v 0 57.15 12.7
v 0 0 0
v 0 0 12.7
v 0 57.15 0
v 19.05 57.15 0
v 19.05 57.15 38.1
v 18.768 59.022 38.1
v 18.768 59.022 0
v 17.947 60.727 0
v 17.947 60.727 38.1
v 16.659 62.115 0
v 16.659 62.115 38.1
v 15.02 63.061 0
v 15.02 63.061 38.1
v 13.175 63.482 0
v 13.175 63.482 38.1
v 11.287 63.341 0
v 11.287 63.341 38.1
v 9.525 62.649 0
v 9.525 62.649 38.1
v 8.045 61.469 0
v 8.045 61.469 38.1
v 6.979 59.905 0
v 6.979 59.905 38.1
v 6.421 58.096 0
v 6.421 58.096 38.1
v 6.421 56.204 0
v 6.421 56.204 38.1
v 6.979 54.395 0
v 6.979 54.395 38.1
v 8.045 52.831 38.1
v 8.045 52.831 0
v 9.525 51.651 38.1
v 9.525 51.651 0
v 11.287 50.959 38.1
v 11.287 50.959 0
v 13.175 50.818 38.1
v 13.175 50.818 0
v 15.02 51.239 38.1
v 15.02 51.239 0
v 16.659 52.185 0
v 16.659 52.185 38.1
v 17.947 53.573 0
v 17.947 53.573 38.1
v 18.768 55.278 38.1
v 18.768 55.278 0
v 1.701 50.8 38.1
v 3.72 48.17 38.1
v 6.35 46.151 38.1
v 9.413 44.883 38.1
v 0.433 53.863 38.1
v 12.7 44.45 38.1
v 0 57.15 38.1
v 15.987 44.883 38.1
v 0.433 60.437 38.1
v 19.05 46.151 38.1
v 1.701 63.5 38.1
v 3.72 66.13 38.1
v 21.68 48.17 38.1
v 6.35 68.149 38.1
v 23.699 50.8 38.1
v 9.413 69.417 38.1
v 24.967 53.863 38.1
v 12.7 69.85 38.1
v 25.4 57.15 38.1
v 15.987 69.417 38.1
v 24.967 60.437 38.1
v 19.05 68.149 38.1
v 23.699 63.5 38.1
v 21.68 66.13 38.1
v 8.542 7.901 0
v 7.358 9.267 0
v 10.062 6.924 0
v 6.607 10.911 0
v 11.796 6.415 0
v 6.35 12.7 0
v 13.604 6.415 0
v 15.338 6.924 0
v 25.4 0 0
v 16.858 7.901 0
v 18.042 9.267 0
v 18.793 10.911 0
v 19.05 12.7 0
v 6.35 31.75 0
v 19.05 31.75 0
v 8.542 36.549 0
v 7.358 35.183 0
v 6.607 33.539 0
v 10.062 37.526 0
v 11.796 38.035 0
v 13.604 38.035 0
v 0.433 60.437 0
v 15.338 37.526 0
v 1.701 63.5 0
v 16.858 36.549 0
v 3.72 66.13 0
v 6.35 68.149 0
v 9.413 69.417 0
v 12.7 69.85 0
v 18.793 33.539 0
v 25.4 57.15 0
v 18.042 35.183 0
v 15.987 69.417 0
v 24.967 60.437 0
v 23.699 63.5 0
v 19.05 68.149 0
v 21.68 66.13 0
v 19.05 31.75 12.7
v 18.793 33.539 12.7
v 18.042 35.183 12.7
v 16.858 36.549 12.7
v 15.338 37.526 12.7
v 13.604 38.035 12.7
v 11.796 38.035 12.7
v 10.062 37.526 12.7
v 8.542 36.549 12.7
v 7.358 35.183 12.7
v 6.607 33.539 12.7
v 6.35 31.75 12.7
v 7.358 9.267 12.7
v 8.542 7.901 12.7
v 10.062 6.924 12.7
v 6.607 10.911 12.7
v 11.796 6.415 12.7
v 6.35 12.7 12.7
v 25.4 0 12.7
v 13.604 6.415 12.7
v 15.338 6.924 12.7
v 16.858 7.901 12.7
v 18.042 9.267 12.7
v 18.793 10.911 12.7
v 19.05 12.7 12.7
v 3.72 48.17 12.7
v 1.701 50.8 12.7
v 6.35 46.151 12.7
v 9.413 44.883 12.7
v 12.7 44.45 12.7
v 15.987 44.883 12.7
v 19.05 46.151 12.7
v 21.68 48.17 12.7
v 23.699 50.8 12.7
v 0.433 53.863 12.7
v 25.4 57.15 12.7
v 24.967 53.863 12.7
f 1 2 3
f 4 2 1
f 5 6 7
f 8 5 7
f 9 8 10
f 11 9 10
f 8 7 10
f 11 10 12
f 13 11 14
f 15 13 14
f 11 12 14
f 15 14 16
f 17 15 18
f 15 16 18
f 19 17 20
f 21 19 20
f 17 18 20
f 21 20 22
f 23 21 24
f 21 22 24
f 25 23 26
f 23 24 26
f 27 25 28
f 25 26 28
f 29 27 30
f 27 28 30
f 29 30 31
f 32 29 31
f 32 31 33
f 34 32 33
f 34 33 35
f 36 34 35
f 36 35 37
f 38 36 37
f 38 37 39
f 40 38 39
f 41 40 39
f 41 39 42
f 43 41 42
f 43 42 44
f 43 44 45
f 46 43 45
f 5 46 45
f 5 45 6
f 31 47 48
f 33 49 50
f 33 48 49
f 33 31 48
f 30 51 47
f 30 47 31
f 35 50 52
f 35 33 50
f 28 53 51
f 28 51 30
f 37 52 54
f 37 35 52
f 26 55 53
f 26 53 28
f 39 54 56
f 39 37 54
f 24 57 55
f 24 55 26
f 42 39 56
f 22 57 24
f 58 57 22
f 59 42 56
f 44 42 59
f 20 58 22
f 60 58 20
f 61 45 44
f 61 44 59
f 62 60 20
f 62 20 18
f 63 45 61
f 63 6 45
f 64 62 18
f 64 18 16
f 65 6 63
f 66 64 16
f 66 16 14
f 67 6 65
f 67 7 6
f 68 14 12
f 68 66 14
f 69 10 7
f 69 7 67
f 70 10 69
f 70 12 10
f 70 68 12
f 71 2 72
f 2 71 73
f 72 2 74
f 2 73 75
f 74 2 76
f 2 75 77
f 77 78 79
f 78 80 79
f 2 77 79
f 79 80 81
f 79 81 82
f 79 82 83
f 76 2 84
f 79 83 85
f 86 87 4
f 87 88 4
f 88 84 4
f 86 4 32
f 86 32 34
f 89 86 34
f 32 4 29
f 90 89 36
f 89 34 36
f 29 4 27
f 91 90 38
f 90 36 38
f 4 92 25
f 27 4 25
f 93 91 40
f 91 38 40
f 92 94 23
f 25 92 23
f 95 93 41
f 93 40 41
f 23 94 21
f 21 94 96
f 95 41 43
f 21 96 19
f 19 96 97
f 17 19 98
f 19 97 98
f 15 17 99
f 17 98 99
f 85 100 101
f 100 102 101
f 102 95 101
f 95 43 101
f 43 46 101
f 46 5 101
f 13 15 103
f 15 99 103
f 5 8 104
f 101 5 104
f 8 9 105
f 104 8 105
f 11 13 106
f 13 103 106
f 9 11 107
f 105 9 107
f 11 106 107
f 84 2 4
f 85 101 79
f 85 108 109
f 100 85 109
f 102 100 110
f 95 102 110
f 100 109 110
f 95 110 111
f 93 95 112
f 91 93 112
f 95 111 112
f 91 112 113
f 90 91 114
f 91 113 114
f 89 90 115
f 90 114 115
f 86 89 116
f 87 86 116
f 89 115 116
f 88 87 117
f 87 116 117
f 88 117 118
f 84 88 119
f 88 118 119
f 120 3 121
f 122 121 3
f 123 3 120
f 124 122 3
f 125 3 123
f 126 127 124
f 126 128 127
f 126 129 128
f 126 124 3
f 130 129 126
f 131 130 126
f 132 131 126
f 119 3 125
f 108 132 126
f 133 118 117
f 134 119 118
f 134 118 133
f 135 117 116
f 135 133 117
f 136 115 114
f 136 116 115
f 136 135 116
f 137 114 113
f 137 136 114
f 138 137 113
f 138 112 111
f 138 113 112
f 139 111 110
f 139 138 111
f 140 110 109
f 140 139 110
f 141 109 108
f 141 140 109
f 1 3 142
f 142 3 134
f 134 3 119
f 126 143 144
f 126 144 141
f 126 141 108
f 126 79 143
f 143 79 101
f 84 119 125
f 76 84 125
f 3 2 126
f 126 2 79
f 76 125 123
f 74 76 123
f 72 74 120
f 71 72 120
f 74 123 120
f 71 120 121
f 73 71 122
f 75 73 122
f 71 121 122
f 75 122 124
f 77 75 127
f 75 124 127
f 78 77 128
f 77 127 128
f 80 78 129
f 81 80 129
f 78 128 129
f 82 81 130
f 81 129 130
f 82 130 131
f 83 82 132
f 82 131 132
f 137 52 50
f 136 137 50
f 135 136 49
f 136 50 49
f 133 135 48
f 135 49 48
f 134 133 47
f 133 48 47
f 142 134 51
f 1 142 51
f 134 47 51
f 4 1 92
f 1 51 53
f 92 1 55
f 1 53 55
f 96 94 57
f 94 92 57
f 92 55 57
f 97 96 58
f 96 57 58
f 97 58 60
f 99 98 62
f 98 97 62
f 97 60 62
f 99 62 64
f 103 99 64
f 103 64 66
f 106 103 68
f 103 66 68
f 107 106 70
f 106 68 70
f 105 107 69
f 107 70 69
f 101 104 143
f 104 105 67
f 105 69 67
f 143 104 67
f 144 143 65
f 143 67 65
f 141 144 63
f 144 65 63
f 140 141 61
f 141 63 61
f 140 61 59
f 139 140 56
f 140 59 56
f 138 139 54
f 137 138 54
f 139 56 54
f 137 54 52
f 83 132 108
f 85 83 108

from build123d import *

# Parameters (mm, degrees)
F0_W      = 25.4
F0_H      = 69.85
F1_DEPTH  = 38.1
F2_W      = 44.45
F2_H      = 25.4
F3_DEPTH  = 25.4
F5_DEPTH  = 25.4
F7_DEPTH  = 25.4
F4_W      = 25.4
F4_H      = 25.4
F8_DEPTH  = 25.4
F9_R      = 6.35
F10_DEPTH = 76.2
F11_DEPTH = 25.4
F13_DEPTH = 25.4


with BuildPart() as f1:
    # F0 (on Top) → F1 (new body)
    with BuildSketch(Plane.XY):
        with Locations((12.7, 34.925)):
            Rectangle(F0_W, F0_H)
    extrude(amount=F1_DEPTH)

    # F2 (on face) → F3 (cut)
    with BuildSketch(Plane(origin=(0, 0, 0), x_dir=(0, -1, 0), z_dir=(-1, 0, 0))):
        with Locations((-22.225, 25.4)):
            Rectangle(F2_W, F2_H)
    extrude(amount=-F3_DEPTH, mode=Mode.SUBTRACT)

    # F2 (on face) → F5 (cut)
    with BuildSketch(Plane(origin=(0, 0, 0), x_dir=(0, -1, 0), z_dir=(-1, 0, 0))):
        with Locations((-22.225, 25.4)):
            Rectangle(F2_W, F2_H)
    extrude(amount=-F5_DEPTH, mode=Mode.SUBTRACT)

    # F6 (on face) → F7 (cut)
    with BuildSketch(Plane.XY.offset(38.1)):
        with BuildLine():
            ThreePointArc((0, 57.15), (3.7197438789, 66.1302561211), (12.7, 69.85))
            Line((12.7, 69.85), (0, 69.85))
            Line((0, 69.85), (0, 57.15))
        make_face()
        with BuildLine():
            ThreePointArc((12.7, 69.85), (21.6802561211, 66.1302561211), (25.4, 57.15))
            Line((25.4, 57.15), (25.4, 69.85))
            Line((25.4, 69.85), (12.7, 69.85))
        make_face()
        with BuildLine():
            Line((0, 44.45), (12.7, 44.45))
            ThreePointArc((12.7, 44.45), (3.7197438789, 48.1697438789), (0, 57.15))
            Line((0, 57.15), (0, 44.45))
        make_face()
        with BuildLine():
            Line((25.4, 44.45), (25.4, 57.15))
            ThreePointArc((25.4, 57.15), (21.6802561211, 48.1697438789), (12.7, 44.45))
            Line((12.7, 44.45), (25.4, 44.45))
        make_face()
    extrude(amount=-F7_DEPTH, mode=Mode.SUBTRACT)

    # F4 (on face) → F8 (cut)
    with BuildSketch(Plane.XY.offset(38.1)):
        with Locations((12.7, 57.15)):
            Rectangle(F4_W, F4_H)
    extrude(amount=F8_DEPTH, mode=Mode.SUBTRACT)

    # F9 (on face) → F10 (cut)
    with BuildSketch(Plane.XY.offset(38.1)):
        with Locations((12.7, 57.15)):
            Circle(F9_R)
    extrude(amount=-F10_DEPTH, mode=Mode.SUBTRACT)

    # F11 (cut): faces of the model
    f11_faces = [f1.faces().sort_by_distance(p)[0] for p in [
        (2.8367728246, 67.0132271754, 12.7),
        (22.5632271754, 67.0132271754, 12.7),
    ]]
    extrude(f11_faces, amount=-F11_DEPTH, mode=Mode.SUBTRACT)

    # F12 (on face) → F13 (cut)
    with BuildSketch(Plane.XY.offset(12.7)):
        with BuildLine():
            Line((6.35, 31.75), (19.05, 31.75))
            ThreePointArc((19.05, 31.75), (12.7, 38.1), (6.35, 31.75))
        make_face()
        with BuildLine():
            Line((19.05, 12.7), (19.05, 31.75))
            ThreePointArc((19.05, 31.75), (12.7, 25.4), (6.35, 31.75))
            Line((6.35, 31.75), (6.35, 12.7))
            ThreePointArc((6.35, 12.7), (12.7, 19.05), (19.05, 12.7))
        make_face()
        with BuildLine():
            ThreePointArc((6.35, 31.75), (12.7, 25.4), (19.05, 31.75))
            Line((19.05, 31.75), (6.35, 31.75))
        make_face()
        with BuildLine():
            ThreePointArc((6.35, 12.7), (12.7, 6.35), (19.05, 12.7))
            ThreePointArc((19.05, 12.7), (12.7, 19.05), (6.35, 12.7))
        make_face()
    extrude(amount=-F13_DEPTH, mode=Mode.SUBTRACT)


solid = f1.part
